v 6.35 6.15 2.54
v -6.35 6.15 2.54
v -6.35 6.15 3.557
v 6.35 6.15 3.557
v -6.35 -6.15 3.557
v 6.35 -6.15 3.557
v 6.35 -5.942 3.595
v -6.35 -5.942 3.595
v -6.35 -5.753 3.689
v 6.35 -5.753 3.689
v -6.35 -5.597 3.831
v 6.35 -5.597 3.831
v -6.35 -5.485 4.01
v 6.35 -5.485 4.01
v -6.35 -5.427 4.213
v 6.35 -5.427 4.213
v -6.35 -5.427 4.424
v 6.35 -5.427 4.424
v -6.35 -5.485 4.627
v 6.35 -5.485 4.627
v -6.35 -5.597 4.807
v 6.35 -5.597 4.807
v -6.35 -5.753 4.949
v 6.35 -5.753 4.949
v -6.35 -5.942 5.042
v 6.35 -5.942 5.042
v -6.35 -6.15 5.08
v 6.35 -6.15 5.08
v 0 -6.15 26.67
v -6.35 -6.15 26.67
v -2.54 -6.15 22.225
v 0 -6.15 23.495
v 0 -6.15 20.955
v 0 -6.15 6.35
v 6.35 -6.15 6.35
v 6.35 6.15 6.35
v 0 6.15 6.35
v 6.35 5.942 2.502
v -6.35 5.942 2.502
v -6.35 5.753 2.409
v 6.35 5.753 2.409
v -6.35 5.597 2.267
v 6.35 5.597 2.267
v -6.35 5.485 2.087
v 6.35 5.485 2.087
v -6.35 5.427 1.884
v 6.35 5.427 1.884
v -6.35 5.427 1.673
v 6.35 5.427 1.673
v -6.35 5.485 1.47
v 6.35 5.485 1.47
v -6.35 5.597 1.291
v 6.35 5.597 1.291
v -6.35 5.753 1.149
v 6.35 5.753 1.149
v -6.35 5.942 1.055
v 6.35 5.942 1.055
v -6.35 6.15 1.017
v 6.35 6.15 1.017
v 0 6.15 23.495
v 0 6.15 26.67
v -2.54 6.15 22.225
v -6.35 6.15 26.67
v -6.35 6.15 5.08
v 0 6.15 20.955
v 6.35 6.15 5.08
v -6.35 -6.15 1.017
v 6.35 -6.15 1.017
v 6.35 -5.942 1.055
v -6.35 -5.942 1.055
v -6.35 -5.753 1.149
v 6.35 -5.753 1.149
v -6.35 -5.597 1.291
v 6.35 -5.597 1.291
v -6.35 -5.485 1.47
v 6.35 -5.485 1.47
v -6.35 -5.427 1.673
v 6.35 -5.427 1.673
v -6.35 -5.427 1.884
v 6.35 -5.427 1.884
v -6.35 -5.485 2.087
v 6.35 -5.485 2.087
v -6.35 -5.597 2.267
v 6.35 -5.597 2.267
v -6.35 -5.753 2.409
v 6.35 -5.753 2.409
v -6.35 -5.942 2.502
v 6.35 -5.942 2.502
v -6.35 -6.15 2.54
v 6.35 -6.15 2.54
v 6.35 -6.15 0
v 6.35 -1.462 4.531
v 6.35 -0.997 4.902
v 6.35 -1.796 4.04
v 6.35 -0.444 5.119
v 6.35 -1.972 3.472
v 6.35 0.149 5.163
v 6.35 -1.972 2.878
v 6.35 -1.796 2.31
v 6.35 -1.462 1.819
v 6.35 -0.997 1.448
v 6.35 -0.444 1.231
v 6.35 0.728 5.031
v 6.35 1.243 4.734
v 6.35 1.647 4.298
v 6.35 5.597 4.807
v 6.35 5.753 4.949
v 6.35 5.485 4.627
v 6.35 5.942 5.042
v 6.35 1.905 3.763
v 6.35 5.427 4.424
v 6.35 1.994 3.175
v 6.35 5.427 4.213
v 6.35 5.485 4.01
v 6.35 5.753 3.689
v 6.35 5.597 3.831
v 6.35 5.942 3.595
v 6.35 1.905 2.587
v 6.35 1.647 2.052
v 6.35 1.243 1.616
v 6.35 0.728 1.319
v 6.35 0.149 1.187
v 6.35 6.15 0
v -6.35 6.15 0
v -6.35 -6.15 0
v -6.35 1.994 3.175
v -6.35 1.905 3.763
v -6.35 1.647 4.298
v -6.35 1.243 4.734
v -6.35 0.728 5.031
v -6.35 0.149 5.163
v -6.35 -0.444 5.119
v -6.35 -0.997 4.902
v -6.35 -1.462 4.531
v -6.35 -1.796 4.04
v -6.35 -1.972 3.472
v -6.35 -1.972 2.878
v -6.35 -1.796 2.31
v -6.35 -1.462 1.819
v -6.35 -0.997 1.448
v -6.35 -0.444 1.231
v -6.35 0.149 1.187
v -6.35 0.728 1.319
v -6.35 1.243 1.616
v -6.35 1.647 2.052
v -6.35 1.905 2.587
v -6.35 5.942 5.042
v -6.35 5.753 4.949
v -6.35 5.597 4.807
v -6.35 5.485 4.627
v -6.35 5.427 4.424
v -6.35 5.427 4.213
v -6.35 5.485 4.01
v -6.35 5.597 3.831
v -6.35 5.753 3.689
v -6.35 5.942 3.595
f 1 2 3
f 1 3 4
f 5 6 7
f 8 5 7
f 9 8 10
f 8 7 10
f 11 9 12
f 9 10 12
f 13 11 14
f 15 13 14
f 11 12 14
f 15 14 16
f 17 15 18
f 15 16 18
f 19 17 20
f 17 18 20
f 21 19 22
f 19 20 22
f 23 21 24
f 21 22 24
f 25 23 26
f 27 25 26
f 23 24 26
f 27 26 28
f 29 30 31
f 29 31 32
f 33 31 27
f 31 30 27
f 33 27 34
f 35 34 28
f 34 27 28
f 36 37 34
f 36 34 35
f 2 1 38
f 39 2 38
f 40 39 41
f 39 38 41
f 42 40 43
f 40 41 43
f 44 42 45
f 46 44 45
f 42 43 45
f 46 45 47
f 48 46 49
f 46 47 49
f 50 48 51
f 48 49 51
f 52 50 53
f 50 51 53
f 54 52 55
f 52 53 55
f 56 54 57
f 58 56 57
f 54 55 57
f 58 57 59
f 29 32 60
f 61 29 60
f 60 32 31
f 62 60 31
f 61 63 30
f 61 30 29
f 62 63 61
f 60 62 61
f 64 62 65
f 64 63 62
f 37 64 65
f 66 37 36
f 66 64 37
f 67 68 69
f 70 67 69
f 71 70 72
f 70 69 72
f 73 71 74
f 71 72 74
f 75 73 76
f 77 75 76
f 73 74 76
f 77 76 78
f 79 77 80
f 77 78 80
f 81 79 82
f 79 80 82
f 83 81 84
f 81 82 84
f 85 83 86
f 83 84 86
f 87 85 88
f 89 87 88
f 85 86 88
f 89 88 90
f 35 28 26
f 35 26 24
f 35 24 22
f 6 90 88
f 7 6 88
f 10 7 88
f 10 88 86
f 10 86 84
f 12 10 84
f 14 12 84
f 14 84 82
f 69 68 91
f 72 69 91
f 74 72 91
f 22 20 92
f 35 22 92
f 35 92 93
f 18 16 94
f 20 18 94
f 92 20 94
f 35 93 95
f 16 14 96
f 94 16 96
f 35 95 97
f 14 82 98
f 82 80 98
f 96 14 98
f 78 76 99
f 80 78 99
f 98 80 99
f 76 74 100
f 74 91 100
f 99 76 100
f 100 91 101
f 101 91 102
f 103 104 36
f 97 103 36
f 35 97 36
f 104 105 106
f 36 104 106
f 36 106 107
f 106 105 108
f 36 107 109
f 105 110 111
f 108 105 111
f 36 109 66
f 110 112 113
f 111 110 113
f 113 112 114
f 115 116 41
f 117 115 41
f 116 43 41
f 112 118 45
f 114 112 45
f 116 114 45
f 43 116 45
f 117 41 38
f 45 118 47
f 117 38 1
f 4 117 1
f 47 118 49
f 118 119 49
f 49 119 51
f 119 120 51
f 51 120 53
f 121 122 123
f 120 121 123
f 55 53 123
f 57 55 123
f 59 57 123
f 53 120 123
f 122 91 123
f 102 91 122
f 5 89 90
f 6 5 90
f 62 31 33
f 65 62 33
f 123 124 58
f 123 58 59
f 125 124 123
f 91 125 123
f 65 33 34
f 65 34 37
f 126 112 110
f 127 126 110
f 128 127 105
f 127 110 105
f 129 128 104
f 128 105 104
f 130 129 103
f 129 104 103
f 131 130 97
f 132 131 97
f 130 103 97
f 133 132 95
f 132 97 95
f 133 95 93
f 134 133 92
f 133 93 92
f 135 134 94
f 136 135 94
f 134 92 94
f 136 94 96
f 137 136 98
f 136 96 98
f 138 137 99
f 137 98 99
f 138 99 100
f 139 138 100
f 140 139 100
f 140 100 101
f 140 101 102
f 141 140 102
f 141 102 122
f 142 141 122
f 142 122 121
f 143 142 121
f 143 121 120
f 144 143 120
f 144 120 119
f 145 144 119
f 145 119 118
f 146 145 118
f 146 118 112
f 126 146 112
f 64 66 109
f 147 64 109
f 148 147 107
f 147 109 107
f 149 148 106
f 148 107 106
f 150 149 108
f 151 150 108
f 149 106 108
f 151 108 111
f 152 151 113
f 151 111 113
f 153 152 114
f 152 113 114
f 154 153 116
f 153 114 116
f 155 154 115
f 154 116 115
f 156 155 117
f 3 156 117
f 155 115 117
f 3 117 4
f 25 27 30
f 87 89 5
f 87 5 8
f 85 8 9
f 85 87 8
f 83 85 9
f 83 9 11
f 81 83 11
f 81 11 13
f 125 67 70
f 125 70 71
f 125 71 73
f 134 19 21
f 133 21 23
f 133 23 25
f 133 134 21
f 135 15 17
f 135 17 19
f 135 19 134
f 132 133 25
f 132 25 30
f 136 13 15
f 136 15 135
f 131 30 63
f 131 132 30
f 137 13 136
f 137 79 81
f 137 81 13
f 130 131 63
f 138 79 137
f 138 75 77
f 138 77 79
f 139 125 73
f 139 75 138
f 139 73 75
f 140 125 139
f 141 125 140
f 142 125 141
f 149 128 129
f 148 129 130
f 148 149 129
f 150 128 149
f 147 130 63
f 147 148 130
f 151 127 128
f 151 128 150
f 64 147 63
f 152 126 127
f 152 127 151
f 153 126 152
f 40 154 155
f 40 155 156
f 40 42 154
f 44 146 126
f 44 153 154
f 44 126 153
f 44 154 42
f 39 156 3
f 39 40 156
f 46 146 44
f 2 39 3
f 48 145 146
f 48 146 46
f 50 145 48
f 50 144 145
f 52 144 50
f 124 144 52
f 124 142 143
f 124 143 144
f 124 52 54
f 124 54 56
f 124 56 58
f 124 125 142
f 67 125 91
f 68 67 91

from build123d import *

# Parameters (mm, degrees)
F0_W     = 12.7
F0_H     = 12.3
F1_DEPTH = 6.35
F2_W     = 6.35
F2_H     = 12.3
F3_DEPTH = 20.32
F4_R     = 1.9939
F5_DEPTH = 12.701
F7_DEPTH = 12.301
F9_DEPTH = 12.701


with BuildPart() as f1:
    # F0 (on Top) → F1 (new body)
    with BuildSketch(Plane.XY):
        Rectangle(F0_W, F0_H)
    extrude(amount=F1_DEPTH)

    # F2 (on face) → F3 (join)
    with BuildSketch(Plane.XY.offset(6.35)):
        with Locations((-3.175, 0)):
            Rectangle(F2_W, F2_H)
    extrude(amount=F3_DEPTH)

    # F4 (on face) → F5 (cut, through all)
    with BuildSketch(Plane.YZ.offset(6.35)):
        with Locations((0, 3.175)):
            Circle(F4_R)
    extrude(amount=-F5_DEPTH, mode=Mode.SUBTRACT)

    # F6 (on face) → F7 (cut, through all)
    with BuildSketch(Plane.XZ.offset(6.15)):
        Polygon((0, 20.955), (0, 23.495), (-2.54, 22.225), align=None)
    extrude(amount=-F7_DEPTH, mode=Mode.SUBTRACT)

    # F8 (on face) → F9 (cut, through all)
    with BuildSketch(Plane.YZ.offset(6.35)):
        with BuildLine():
            Line((-6.15, 5.08), (-6.15, 3.557324))
            ThreePointArc((-6.15, 3.557324), (-5.41976, 4.318662), (-6.15, 5.08))
        make_face()
        with BuildLine():
            Line((-6.15, 2.54), (-6.15, 1.017324))
            ThreePointArc((-6.15, 1.017324), (-5.41976, 1.778662), (-6.15, 2.54))
        make_face()
        with BuildLine():
            ThreePointArc((6.15, 2.54), (5.41976, 1.778662), (6.15, 1.017324))
            Line((6.15, 1.017324), (6.15, 2.54))
        make_face()
        with BuildLine():
            ThreePointArc((6.15, 5.08), (5.41976, 4.318662), (6.15, 3.557324))
            Line((6.15, 3.557324), (6.15, 5.08))
        make_face()
    extrude(amount=-F9_DEPTH, mode=Mode.SUBTRACT)


solid = f1.part
